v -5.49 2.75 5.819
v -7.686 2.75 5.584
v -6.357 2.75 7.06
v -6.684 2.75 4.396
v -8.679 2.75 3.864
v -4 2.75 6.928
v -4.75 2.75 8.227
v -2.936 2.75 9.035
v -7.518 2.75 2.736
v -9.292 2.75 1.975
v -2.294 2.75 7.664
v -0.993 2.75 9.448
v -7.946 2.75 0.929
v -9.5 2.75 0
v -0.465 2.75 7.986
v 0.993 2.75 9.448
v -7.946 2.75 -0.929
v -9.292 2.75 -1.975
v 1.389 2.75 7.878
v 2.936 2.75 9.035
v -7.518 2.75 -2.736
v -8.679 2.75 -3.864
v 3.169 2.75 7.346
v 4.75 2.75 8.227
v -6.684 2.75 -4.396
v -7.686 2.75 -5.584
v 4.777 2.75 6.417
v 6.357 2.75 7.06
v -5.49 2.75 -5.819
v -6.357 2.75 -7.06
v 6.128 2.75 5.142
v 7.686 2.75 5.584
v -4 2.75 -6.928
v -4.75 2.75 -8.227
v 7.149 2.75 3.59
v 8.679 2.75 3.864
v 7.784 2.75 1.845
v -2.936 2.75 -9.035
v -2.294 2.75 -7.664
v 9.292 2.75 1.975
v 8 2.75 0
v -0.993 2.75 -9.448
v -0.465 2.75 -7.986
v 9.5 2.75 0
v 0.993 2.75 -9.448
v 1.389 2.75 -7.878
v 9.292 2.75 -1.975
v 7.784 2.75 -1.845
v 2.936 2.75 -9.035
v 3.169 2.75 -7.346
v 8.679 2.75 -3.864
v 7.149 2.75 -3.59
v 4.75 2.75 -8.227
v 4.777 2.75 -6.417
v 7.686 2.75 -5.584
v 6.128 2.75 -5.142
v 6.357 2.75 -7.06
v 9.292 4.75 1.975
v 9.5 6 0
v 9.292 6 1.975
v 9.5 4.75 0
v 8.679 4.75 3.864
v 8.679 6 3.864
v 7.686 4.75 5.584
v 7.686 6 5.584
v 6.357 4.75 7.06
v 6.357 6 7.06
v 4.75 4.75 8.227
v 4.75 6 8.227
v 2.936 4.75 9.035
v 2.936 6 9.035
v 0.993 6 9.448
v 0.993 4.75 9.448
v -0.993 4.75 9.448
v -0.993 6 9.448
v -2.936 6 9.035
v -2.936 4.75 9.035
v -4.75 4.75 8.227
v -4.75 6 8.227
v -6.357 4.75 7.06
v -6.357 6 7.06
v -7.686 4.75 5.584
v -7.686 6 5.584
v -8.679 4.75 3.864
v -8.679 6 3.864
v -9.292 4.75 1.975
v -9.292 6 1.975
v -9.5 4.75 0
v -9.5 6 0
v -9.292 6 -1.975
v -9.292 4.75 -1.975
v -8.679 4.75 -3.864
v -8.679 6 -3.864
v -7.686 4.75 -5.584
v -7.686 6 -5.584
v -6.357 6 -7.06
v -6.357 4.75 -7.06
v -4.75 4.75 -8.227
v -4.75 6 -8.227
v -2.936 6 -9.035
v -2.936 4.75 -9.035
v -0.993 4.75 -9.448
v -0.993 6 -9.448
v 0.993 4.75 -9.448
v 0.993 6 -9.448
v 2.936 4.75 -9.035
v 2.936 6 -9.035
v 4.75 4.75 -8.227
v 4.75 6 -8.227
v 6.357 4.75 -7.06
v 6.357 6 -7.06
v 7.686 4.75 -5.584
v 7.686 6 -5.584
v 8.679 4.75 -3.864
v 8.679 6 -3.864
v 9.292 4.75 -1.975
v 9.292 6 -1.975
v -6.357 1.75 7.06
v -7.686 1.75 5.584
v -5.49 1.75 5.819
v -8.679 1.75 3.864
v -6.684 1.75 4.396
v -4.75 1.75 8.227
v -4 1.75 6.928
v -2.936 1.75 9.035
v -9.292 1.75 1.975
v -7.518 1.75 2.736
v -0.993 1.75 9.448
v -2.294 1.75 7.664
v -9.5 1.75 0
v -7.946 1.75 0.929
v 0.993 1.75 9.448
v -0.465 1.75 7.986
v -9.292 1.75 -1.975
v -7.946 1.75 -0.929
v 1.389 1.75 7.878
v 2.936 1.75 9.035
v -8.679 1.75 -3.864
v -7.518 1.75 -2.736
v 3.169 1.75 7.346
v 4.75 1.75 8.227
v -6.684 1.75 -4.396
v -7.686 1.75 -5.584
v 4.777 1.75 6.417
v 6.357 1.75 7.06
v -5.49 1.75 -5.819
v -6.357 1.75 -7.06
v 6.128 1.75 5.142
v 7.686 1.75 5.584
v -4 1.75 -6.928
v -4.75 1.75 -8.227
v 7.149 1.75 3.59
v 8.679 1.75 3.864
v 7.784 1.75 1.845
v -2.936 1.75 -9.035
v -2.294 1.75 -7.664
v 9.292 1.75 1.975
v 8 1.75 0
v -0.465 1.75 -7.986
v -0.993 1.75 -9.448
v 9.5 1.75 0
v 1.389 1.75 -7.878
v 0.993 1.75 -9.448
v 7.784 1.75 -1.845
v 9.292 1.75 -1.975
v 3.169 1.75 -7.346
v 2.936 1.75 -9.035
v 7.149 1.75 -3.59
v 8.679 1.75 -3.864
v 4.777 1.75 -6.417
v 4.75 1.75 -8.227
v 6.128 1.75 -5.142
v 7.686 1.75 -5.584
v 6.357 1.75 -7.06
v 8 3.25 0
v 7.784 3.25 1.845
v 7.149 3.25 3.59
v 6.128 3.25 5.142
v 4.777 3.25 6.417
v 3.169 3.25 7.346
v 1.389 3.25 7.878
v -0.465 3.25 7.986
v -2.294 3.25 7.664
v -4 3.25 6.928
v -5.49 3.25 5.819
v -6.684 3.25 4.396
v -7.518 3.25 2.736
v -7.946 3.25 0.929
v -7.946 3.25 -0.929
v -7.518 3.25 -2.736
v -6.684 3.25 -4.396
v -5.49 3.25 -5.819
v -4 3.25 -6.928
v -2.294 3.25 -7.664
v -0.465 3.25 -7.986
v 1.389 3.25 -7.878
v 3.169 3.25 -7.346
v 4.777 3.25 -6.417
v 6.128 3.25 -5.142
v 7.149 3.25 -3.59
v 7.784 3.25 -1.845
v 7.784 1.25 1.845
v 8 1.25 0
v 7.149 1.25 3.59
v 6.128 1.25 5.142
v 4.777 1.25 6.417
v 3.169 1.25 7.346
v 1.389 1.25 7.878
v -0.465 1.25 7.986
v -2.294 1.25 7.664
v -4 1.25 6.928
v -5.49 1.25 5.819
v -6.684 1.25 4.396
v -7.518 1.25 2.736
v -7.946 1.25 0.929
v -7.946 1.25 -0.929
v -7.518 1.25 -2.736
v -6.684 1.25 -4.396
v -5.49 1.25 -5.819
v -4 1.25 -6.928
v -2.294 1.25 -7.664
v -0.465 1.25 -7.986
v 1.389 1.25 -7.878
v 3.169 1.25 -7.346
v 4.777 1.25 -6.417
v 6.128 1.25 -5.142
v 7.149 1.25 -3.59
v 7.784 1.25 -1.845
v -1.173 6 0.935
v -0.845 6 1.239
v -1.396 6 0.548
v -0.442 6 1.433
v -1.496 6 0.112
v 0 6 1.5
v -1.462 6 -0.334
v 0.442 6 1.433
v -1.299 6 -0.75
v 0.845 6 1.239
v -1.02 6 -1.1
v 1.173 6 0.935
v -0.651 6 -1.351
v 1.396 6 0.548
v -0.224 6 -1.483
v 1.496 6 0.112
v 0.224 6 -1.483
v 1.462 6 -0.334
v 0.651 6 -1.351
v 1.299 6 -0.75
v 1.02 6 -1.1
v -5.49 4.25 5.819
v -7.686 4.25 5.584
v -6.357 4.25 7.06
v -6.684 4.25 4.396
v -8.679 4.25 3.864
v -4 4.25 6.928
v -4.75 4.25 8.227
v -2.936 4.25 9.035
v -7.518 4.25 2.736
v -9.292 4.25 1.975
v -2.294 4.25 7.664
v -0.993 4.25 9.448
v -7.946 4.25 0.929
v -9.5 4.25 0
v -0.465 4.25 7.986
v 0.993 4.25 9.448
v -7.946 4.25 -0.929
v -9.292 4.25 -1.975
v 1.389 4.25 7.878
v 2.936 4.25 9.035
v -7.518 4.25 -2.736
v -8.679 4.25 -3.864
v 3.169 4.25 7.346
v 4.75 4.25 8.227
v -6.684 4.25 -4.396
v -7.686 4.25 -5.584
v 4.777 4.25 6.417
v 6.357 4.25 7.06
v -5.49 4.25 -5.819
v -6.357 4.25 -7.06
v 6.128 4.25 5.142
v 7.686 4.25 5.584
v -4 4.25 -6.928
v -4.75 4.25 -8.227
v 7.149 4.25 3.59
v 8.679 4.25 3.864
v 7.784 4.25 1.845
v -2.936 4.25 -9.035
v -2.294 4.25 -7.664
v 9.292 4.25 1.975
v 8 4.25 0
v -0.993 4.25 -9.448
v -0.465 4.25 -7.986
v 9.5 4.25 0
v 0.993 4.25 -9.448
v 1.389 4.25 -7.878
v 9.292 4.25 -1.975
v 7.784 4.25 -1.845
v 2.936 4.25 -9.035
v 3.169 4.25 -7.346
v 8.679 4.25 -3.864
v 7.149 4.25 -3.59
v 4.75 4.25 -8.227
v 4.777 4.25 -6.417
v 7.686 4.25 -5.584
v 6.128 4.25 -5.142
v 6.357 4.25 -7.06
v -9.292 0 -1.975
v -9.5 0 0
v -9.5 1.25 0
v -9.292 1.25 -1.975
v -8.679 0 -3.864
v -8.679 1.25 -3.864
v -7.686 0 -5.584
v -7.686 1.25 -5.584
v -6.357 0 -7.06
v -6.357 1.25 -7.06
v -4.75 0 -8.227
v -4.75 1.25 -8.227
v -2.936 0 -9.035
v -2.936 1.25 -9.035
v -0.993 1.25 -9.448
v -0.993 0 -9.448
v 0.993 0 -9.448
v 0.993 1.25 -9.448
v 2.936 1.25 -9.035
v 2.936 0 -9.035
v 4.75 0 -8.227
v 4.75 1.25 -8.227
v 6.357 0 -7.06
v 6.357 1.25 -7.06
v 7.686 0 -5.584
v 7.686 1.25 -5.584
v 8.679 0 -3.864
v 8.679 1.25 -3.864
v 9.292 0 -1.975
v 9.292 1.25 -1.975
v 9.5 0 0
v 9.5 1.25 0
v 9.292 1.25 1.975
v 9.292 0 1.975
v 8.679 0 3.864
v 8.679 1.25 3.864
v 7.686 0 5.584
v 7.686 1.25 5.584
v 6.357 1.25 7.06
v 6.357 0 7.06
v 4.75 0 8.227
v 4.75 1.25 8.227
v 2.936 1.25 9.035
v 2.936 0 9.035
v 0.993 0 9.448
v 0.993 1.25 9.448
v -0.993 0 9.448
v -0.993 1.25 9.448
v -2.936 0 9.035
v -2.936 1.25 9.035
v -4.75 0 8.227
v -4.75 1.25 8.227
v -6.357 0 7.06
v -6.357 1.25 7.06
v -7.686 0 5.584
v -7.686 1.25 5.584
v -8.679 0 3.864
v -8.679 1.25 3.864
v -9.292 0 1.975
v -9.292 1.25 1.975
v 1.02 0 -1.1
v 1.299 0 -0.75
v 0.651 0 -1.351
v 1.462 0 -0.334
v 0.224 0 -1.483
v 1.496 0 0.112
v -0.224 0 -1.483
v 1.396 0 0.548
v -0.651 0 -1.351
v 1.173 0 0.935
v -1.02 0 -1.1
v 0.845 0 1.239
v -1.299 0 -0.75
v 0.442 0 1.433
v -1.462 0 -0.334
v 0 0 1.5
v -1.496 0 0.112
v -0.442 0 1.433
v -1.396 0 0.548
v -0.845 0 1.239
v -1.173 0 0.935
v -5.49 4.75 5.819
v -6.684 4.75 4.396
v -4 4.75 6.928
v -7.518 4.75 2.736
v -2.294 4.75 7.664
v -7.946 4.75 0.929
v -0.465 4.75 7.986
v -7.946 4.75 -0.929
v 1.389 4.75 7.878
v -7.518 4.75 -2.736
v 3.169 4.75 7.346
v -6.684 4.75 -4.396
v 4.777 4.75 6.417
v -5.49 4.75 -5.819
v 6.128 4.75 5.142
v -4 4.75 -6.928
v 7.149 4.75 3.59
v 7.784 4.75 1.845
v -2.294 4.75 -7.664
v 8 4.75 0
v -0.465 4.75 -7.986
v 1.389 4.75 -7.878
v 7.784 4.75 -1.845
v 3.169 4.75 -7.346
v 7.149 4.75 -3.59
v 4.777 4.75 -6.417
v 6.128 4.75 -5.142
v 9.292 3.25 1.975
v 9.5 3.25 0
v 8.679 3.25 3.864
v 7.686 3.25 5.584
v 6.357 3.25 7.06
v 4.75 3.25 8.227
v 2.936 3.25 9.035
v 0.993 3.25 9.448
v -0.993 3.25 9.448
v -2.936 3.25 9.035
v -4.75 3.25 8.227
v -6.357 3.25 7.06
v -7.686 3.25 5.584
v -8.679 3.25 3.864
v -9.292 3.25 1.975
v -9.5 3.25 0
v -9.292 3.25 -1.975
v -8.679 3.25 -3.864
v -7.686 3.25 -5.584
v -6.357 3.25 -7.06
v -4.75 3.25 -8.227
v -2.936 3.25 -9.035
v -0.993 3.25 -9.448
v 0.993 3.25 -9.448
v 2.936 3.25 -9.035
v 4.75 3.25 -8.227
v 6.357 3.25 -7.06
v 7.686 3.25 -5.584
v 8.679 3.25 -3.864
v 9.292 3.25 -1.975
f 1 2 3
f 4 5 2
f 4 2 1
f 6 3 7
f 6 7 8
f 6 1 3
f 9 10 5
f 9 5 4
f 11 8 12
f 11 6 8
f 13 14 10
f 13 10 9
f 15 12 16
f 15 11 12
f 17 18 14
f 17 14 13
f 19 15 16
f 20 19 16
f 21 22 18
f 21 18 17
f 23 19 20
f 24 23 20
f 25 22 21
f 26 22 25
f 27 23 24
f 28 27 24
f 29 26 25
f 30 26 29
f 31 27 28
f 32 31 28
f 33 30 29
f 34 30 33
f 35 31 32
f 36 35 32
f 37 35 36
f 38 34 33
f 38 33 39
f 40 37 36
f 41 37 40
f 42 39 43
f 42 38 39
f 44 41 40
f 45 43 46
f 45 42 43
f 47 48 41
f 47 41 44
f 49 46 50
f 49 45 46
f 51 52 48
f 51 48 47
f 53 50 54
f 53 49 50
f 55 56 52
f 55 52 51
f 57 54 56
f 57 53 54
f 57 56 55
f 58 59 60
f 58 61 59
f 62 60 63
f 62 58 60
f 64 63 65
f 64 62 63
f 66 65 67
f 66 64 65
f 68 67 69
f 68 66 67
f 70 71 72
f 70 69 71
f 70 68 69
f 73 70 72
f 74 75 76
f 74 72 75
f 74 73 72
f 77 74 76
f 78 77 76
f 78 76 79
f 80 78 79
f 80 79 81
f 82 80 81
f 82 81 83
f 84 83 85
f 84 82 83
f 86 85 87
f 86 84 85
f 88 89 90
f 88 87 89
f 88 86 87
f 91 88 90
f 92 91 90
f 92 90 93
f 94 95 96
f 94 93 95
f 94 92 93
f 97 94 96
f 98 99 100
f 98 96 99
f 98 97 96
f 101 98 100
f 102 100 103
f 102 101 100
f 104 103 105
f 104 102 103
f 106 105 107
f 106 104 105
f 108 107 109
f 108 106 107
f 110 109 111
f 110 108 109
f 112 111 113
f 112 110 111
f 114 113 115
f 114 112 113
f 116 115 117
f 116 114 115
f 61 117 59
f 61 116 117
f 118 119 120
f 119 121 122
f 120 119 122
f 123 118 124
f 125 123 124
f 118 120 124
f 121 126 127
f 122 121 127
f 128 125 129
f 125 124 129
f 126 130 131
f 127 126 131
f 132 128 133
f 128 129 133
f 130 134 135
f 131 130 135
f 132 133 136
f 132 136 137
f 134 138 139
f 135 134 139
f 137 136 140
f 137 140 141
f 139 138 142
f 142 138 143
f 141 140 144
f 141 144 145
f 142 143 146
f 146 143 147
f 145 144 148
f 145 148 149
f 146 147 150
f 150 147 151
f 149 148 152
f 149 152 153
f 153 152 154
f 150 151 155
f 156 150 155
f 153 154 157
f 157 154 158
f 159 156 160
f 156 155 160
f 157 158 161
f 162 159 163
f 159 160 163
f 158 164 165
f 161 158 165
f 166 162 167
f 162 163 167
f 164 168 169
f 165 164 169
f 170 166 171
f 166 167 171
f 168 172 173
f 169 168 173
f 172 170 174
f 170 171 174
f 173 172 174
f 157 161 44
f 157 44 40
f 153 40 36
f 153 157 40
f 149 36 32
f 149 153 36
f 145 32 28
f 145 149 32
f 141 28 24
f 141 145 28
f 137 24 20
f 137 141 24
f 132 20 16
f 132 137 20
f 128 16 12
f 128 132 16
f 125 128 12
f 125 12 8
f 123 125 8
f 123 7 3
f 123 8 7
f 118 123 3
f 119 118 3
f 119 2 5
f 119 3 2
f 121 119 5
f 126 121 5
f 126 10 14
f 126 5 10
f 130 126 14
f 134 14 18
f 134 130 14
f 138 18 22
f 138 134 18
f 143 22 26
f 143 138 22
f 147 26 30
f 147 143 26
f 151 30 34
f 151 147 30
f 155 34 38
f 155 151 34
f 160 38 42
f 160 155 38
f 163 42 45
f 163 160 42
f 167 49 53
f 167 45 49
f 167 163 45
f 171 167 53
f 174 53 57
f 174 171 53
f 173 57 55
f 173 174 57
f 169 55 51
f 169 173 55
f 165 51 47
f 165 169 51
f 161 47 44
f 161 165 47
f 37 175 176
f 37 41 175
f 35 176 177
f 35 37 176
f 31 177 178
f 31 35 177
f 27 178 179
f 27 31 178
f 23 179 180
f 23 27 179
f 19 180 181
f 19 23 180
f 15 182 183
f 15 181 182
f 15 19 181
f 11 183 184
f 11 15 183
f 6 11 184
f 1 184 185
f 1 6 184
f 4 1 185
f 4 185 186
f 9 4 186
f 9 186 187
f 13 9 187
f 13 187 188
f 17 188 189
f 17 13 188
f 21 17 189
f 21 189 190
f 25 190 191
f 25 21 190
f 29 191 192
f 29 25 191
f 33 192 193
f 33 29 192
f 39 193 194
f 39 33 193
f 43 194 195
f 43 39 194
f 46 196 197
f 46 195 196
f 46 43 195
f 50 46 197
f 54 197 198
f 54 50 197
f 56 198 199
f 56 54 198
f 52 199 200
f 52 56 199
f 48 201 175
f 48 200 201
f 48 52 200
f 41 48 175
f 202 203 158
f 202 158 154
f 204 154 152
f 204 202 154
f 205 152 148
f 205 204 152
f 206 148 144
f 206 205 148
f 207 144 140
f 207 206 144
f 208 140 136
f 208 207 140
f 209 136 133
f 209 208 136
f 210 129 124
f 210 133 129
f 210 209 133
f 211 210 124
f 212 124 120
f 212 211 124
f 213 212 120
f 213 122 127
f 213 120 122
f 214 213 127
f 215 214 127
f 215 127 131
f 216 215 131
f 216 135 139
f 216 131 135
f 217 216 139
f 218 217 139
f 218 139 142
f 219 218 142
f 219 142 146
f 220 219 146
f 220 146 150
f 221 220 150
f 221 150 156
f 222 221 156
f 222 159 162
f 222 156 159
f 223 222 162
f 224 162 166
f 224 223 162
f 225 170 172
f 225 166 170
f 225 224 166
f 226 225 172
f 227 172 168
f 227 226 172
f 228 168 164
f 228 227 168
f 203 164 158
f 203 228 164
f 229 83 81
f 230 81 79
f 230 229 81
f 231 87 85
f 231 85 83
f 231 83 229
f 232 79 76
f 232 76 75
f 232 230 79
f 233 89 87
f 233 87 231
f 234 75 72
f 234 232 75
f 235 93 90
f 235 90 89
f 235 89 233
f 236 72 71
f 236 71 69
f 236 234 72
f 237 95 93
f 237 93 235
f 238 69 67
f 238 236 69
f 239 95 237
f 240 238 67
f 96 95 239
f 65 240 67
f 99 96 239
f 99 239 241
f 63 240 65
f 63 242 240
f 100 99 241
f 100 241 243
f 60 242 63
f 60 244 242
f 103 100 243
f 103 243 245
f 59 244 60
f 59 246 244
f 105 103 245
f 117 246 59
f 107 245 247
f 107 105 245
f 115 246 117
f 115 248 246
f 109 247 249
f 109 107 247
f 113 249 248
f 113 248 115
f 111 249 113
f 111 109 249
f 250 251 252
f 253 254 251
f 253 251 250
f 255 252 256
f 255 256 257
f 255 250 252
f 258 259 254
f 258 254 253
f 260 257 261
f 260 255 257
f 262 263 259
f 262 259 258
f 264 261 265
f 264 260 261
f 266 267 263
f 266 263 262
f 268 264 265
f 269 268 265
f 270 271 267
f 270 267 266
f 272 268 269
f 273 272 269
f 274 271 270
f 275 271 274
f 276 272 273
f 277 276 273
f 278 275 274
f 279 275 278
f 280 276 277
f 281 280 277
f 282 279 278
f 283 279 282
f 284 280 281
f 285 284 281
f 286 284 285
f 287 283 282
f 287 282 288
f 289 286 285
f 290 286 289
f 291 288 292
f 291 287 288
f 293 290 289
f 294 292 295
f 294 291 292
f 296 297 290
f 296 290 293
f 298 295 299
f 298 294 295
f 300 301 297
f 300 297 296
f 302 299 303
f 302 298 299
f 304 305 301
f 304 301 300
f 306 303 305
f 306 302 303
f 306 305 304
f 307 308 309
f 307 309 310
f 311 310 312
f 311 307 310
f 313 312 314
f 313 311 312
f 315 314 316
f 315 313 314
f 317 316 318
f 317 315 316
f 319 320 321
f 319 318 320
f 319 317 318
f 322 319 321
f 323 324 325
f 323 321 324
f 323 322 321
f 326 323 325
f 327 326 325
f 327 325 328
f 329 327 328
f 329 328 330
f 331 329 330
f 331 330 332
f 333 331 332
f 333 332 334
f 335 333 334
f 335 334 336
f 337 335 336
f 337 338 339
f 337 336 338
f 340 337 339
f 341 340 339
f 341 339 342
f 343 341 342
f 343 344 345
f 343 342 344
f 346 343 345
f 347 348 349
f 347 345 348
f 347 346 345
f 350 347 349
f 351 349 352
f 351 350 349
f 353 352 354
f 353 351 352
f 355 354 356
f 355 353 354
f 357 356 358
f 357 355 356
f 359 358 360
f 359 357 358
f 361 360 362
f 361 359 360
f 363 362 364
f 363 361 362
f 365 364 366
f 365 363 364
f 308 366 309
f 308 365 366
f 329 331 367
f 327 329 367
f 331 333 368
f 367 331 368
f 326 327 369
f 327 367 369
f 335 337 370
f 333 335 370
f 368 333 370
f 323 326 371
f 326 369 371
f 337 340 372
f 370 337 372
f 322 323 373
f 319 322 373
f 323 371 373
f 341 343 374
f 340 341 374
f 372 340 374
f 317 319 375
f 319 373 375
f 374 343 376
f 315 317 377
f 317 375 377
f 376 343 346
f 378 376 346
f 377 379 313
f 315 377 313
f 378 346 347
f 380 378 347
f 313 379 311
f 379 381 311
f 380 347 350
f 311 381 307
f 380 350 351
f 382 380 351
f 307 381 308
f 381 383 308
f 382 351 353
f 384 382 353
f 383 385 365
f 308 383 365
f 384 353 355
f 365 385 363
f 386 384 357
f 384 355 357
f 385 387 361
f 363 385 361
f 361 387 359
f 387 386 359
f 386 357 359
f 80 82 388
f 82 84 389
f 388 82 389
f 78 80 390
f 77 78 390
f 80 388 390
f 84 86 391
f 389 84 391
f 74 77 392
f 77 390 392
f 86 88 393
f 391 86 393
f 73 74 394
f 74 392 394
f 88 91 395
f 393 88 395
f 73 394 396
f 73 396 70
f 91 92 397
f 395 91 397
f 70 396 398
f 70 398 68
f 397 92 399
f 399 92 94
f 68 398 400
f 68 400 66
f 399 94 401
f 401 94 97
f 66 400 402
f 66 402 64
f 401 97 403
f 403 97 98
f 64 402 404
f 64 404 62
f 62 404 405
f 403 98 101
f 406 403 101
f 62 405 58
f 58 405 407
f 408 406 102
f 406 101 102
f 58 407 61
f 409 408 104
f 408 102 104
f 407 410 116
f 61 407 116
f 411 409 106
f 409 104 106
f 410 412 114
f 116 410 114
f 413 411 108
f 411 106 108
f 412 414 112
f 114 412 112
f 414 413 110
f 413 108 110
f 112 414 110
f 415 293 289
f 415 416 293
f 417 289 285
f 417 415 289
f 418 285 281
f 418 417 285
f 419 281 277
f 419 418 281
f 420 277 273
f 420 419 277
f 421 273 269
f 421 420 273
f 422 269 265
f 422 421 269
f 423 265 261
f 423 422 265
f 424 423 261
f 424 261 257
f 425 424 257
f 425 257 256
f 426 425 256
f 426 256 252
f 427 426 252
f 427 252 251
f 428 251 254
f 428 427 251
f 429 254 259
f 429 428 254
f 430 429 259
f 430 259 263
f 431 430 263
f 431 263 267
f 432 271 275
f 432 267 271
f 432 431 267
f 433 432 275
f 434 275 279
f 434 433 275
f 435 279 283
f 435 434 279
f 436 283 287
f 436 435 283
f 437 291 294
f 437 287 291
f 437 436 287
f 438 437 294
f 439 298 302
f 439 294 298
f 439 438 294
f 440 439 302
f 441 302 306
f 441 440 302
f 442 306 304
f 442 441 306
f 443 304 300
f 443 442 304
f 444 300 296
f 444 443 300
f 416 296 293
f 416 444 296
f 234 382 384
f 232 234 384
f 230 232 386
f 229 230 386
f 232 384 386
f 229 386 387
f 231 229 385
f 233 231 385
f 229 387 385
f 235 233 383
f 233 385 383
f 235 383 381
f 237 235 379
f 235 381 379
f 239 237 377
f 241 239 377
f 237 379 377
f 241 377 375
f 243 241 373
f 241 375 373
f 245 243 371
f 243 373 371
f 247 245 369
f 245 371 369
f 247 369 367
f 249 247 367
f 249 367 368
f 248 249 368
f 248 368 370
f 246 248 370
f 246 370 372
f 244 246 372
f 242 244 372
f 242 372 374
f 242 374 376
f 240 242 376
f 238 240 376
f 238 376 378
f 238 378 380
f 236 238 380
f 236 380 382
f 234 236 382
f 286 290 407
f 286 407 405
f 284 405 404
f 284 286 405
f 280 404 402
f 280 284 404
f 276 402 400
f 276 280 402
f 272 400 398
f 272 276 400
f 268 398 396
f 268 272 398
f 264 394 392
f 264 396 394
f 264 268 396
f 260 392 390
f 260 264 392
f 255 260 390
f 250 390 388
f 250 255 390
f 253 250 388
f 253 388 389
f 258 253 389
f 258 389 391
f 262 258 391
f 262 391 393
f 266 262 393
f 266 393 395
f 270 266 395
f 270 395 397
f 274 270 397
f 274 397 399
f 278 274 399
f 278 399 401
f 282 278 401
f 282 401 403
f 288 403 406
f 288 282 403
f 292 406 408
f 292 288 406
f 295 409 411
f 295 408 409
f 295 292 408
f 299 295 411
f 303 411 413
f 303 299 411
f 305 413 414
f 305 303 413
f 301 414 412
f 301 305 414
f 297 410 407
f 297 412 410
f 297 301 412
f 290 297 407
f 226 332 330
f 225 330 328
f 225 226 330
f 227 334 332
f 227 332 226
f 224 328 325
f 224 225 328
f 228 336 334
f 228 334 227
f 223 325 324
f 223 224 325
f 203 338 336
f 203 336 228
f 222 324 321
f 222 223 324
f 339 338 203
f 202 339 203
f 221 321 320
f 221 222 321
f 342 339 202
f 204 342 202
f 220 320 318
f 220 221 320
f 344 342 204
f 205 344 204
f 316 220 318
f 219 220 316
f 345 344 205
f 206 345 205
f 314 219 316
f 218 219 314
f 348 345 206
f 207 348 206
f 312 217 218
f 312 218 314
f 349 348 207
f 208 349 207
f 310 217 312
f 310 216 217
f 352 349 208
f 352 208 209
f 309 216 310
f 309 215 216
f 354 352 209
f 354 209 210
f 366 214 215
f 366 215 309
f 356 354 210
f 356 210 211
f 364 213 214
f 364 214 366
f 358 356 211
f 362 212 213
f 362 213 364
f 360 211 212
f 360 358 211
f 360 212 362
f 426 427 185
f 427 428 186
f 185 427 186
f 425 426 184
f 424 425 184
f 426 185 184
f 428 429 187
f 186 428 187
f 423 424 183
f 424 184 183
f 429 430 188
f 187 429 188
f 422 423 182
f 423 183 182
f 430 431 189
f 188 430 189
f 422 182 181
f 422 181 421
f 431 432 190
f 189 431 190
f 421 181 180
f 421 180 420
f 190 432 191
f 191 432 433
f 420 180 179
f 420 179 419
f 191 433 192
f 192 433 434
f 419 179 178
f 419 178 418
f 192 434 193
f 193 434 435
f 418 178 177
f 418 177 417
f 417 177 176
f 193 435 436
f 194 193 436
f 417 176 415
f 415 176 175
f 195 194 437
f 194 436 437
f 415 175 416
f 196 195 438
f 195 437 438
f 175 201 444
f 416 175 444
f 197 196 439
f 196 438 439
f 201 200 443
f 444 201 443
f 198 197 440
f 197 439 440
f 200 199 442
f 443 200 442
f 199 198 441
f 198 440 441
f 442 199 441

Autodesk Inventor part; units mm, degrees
ref_plane "YZ Plane" through (0, 0, 0) normal (1, 0, 0) x (0, 1, 0)
ref_plane "XZ Plane" through (0, 0, 0) normal (0, 1, 0) x (-1, 0, 0)
ref_plane "XY Plane" through (0, 0, 0) normal (0, 0, 1) x (1, 0, 0)
sketch "Sketch1" plane through (0, 0, 0) normal (0, 1, 0) x (-1, 0, 0)
  circle A0 centre (0, 0) radius 9.5
  dimension "d0" = 19
extrude "Extrusion1" add sketch "Sketch1" along normal blind 1.25
sketch "Sketch2" plane through (0, 1.25, 0) normal (0, 1, 0) x (1, 0, 0)
  circle A0 centre (0, 0) radius 8
  dimension "d3" = 16
extrude "Extrusion2" add sketch "Sketch2" along normal blind 0.5
sketch "Sketch3" plane through (0, 1.75, 0) normal (0, 1, 0) x (1, 0, 0)
  circle A0 centre (0, 0) radius 9.5
  dimension "d6" = 19
extrude "Extrusion3" add sketch "Sketch3" along normal blind 1
sketch "Sketch4" plane through (0, 2.75, 0) normal (0, 1, 0) x (1, 0, 0)
  circle A0 centre (0, 0) radius 8
  dimension "d9" = 16
extrude "Extrusion4" add sketch "Sketch4" along normal blind 0.5
sketch "Sketch5" plane through (0, 3.25, 0) normal (0, 1, 0) x (1, 0, 0)
  circle A0 centre (0, 0) radius 9.5
  dimension "d12" = 19
extrude "Extrusion5" add sketch "Sketch5" along normal blind 1
sketch "Sketch6" plane through (0, 4.25, 0) normal (0, 1, 0) x (1, 0, 0)
  circle A0 centre (0, 0) radius 42.9812
  circle A1 centre (0, 0) radius 8
  dimension "d15" = 16
extrude "Extrusion6" add sketch "Sketch6" along normal blind 0.5 contours A1
sketch "Sketch7" plane through (0, 4.75, 0) normal (0, 1, 0) x (1, 0, 0)
  circle A0 centre (0, 0) radius 9.5
  dimension "d18" = 19
extrude "Extrusion7" add sketch "Sketch7" along normal blind 1.25
sketch "Sketch8" plane through (0, 6, 0) normal (0, 1, 0) x (1, 0, 0)
  circle A0 centre (0, 0) radius 1.5
  dimension "d21" = 3
hole "Hole1" at (0, 6, 0) direction (0, -1, 0) diameter 3 end through all
thread "Thread1" size "M3x0.5" class "6H" standard "ANSI Metric M Profile" full length
properties material "Brass, Soft Yellow, Welded"
